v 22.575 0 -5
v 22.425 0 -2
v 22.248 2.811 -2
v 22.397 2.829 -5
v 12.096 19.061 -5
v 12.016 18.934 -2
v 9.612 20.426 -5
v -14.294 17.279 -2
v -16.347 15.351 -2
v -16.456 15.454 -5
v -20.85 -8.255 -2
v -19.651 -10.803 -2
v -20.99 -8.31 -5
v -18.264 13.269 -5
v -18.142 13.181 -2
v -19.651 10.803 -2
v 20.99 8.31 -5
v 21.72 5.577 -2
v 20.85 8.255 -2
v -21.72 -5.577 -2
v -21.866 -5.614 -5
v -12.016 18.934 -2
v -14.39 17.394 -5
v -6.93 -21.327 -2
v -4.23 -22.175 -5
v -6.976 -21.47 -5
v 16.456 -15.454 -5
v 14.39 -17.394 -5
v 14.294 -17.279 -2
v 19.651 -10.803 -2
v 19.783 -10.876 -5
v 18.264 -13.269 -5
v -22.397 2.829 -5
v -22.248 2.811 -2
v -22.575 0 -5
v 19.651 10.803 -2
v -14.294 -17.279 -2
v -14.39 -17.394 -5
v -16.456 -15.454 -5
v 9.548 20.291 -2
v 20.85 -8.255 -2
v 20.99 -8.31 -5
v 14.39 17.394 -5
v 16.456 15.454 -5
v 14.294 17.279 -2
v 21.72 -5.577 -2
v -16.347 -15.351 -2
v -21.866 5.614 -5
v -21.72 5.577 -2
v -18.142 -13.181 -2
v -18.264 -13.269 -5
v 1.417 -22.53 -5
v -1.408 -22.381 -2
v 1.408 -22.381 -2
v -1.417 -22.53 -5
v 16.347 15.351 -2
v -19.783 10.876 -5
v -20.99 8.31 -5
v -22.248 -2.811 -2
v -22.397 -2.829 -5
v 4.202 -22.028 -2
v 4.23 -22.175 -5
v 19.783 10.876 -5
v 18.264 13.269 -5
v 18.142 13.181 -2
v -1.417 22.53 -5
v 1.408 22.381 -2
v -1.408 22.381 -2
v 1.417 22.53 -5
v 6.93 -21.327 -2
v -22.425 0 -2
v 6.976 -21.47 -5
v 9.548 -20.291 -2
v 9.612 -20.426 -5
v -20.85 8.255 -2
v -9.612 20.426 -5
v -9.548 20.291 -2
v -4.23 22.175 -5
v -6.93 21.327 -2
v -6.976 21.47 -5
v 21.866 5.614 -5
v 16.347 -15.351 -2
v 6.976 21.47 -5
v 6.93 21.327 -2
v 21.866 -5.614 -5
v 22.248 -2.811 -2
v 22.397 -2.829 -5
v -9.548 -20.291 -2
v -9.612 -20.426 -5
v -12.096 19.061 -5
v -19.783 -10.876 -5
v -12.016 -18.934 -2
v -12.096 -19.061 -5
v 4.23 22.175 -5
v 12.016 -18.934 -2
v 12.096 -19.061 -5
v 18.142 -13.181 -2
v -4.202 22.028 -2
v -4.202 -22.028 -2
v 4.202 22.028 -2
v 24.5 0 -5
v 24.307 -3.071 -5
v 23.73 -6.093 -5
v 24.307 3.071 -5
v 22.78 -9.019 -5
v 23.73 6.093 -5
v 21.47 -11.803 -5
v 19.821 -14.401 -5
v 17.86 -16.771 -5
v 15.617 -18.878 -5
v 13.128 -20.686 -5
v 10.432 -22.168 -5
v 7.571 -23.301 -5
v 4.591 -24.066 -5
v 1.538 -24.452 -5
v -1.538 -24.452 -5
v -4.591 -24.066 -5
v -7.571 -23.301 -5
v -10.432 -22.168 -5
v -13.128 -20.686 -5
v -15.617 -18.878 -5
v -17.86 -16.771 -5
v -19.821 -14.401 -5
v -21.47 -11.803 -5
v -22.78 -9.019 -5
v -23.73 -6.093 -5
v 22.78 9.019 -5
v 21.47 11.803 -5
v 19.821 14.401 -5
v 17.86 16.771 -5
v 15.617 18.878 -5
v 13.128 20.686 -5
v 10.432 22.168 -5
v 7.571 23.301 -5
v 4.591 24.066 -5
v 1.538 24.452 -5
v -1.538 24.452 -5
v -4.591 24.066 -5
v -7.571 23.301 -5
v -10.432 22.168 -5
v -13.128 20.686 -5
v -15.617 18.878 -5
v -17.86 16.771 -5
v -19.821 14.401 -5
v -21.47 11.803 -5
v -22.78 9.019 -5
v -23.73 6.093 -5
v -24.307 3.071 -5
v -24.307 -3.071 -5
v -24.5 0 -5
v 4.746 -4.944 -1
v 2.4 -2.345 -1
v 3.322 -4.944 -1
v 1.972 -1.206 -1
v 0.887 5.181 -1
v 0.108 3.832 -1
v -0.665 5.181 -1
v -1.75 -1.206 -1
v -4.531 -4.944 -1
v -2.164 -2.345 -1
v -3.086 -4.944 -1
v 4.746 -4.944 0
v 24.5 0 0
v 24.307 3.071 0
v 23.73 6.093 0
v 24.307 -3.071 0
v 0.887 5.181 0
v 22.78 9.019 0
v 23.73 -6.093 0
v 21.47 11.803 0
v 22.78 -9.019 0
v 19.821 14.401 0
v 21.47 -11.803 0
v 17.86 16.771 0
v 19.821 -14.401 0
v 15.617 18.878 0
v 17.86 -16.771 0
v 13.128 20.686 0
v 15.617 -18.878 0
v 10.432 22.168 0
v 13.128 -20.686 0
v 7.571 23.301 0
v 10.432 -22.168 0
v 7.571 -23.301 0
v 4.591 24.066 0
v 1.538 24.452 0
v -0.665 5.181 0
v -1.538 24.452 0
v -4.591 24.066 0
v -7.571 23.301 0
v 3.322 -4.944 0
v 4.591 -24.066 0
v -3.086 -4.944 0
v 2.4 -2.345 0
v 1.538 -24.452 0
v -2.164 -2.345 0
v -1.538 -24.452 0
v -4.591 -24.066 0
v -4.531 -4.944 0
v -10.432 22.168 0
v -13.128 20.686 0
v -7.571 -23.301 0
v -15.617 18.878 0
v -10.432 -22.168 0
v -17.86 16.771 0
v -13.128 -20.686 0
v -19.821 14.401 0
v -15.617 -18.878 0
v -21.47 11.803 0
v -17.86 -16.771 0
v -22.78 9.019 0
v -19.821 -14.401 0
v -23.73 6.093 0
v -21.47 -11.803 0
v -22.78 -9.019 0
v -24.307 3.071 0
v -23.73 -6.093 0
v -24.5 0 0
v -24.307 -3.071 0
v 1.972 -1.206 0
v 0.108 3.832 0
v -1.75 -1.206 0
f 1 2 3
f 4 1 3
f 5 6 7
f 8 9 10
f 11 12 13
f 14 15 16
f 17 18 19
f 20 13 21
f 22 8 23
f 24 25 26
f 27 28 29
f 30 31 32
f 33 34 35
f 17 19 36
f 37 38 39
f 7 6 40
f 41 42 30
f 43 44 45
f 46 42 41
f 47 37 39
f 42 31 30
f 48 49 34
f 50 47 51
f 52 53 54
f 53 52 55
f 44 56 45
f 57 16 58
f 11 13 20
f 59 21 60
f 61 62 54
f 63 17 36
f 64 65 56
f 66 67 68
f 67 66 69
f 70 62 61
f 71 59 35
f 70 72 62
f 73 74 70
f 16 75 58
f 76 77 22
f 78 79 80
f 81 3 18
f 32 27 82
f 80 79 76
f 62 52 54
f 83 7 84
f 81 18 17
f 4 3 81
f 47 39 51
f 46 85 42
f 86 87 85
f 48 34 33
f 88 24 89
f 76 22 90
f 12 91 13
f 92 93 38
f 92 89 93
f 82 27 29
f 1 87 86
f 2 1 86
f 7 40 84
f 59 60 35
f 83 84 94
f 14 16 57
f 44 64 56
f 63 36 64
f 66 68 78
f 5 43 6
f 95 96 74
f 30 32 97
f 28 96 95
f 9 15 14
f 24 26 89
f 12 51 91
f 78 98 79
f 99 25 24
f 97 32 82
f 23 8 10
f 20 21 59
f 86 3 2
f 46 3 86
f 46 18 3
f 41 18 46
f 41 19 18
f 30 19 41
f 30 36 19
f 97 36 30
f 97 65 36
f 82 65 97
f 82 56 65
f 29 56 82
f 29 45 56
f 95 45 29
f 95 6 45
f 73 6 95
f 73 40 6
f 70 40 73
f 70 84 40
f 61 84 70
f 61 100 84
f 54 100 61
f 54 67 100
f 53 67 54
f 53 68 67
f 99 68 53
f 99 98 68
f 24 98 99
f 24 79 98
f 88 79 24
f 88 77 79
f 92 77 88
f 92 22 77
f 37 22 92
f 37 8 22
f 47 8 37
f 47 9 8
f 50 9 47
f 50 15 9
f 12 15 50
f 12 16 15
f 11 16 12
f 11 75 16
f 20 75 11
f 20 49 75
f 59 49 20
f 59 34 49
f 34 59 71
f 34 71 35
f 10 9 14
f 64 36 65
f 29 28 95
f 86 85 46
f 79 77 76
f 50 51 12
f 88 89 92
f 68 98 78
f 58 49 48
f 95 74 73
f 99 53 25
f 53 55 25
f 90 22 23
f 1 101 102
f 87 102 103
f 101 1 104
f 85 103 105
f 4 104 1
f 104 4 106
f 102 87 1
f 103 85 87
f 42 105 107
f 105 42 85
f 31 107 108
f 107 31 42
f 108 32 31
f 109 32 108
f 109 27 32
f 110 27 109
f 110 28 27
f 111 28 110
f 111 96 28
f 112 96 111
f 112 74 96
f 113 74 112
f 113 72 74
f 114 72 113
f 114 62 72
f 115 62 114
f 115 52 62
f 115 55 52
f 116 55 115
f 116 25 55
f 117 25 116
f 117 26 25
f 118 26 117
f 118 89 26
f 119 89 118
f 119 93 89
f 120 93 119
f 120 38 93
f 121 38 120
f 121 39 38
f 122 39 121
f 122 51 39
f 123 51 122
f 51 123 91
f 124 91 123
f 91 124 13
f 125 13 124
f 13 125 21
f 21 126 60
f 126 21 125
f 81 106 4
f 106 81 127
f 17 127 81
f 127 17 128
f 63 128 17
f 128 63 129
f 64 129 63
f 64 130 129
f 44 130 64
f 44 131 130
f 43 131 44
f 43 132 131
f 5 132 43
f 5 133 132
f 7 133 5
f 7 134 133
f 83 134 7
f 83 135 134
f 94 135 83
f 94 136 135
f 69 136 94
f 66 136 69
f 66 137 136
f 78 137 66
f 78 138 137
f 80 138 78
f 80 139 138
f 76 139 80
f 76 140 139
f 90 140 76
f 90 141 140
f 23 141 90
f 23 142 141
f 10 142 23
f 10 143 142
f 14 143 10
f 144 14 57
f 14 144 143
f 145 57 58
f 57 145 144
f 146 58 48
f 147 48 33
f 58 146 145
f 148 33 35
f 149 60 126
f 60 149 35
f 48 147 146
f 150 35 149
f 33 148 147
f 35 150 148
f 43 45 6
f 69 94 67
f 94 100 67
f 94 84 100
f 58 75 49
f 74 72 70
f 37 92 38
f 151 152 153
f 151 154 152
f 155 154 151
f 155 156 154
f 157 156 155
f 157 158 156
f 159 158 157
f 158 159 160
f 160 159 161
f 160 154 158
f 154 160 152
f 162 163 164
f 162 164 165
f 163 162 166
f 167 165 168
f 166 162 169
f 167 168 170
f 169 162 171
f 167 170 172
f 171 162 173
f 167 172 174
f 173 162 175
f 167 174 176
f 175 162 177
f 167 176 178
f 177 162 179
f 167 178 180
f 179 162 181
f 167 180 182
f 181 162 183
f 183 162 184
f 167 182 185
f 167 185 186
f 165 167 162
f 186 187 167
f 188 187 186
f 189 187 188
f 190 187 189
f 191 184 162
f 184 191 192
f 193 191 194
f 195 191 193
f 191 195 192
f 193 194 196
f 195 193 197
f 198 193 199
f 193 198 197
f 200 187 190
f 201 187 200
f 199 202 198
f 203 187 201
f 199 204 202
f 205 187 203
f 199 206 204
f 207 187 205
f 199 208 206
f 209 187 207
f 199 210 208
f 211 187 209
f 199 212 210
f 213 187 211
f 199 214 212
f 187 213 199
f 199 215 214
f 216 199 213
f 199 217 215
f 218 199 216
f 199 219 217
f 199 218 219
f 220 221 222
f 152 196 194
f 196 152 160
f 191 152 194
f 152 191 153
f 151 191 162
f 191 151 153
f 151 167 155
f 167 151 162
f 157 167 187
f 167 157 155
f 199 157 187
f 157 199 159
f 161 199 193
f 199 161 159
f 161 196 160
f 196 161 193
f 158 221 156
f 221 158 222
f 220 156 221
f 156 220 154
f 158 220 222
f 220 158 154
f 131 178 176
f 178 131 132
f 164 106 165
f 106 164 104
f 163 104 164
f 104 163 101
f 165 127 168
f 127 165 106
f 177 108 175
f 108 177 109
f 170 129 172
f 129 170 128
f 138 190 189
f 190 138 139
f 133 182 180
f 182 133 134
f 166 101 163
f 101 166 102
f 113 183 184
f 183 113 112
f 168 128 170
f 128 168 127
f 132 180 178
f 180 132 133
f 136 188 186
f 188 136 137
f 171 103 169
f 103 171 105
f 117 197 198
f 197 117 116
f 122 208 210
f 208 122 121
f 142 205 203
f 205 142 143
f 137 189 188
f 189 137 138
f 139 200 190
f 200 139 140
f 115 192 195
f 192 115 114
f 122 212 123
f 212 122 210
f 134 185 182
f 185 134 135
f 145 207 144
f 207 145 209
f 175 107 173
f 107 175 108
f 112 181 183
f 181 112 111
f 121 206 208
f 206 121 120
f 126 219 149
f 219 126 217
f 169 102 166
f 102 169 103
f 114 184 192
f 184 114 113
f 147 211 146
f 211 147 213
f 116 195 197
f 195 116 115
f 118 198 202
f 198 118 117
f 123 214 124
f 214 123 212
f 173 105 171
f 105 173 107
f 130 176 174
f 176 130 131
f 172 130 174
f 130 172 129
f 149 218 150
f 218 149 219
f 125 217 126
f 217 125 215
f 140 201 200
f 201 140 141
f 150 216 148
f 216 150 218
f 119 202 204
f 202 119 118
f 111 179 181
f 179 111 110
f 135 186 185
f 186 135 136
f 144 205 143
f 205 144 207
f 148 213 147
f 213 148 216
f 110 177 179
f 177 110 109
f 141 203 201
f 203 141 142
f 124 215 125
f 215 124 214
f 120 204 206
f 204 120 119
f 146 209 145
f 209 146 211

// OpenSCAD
$fn = 50;


difference() {
	union() {
		translate(v = [0, 0, -5.0000000000]) {
			cylinder(h = 5, r = 24.5000000000);
		}
	}
	union() {
		#translate(v = [0, 0, -5.0000000000]) {
			cylinder(h = 3, r1 = 22.5750000000, r2 = 22.4250000000);
		}
		translate(v = [0, 0, -1]) {
			linear_extrude(height = 1) {
				text(font = "Impact", halign = "center", size = 10, text = "A", valign = "center");
			}
		}
	}
}
